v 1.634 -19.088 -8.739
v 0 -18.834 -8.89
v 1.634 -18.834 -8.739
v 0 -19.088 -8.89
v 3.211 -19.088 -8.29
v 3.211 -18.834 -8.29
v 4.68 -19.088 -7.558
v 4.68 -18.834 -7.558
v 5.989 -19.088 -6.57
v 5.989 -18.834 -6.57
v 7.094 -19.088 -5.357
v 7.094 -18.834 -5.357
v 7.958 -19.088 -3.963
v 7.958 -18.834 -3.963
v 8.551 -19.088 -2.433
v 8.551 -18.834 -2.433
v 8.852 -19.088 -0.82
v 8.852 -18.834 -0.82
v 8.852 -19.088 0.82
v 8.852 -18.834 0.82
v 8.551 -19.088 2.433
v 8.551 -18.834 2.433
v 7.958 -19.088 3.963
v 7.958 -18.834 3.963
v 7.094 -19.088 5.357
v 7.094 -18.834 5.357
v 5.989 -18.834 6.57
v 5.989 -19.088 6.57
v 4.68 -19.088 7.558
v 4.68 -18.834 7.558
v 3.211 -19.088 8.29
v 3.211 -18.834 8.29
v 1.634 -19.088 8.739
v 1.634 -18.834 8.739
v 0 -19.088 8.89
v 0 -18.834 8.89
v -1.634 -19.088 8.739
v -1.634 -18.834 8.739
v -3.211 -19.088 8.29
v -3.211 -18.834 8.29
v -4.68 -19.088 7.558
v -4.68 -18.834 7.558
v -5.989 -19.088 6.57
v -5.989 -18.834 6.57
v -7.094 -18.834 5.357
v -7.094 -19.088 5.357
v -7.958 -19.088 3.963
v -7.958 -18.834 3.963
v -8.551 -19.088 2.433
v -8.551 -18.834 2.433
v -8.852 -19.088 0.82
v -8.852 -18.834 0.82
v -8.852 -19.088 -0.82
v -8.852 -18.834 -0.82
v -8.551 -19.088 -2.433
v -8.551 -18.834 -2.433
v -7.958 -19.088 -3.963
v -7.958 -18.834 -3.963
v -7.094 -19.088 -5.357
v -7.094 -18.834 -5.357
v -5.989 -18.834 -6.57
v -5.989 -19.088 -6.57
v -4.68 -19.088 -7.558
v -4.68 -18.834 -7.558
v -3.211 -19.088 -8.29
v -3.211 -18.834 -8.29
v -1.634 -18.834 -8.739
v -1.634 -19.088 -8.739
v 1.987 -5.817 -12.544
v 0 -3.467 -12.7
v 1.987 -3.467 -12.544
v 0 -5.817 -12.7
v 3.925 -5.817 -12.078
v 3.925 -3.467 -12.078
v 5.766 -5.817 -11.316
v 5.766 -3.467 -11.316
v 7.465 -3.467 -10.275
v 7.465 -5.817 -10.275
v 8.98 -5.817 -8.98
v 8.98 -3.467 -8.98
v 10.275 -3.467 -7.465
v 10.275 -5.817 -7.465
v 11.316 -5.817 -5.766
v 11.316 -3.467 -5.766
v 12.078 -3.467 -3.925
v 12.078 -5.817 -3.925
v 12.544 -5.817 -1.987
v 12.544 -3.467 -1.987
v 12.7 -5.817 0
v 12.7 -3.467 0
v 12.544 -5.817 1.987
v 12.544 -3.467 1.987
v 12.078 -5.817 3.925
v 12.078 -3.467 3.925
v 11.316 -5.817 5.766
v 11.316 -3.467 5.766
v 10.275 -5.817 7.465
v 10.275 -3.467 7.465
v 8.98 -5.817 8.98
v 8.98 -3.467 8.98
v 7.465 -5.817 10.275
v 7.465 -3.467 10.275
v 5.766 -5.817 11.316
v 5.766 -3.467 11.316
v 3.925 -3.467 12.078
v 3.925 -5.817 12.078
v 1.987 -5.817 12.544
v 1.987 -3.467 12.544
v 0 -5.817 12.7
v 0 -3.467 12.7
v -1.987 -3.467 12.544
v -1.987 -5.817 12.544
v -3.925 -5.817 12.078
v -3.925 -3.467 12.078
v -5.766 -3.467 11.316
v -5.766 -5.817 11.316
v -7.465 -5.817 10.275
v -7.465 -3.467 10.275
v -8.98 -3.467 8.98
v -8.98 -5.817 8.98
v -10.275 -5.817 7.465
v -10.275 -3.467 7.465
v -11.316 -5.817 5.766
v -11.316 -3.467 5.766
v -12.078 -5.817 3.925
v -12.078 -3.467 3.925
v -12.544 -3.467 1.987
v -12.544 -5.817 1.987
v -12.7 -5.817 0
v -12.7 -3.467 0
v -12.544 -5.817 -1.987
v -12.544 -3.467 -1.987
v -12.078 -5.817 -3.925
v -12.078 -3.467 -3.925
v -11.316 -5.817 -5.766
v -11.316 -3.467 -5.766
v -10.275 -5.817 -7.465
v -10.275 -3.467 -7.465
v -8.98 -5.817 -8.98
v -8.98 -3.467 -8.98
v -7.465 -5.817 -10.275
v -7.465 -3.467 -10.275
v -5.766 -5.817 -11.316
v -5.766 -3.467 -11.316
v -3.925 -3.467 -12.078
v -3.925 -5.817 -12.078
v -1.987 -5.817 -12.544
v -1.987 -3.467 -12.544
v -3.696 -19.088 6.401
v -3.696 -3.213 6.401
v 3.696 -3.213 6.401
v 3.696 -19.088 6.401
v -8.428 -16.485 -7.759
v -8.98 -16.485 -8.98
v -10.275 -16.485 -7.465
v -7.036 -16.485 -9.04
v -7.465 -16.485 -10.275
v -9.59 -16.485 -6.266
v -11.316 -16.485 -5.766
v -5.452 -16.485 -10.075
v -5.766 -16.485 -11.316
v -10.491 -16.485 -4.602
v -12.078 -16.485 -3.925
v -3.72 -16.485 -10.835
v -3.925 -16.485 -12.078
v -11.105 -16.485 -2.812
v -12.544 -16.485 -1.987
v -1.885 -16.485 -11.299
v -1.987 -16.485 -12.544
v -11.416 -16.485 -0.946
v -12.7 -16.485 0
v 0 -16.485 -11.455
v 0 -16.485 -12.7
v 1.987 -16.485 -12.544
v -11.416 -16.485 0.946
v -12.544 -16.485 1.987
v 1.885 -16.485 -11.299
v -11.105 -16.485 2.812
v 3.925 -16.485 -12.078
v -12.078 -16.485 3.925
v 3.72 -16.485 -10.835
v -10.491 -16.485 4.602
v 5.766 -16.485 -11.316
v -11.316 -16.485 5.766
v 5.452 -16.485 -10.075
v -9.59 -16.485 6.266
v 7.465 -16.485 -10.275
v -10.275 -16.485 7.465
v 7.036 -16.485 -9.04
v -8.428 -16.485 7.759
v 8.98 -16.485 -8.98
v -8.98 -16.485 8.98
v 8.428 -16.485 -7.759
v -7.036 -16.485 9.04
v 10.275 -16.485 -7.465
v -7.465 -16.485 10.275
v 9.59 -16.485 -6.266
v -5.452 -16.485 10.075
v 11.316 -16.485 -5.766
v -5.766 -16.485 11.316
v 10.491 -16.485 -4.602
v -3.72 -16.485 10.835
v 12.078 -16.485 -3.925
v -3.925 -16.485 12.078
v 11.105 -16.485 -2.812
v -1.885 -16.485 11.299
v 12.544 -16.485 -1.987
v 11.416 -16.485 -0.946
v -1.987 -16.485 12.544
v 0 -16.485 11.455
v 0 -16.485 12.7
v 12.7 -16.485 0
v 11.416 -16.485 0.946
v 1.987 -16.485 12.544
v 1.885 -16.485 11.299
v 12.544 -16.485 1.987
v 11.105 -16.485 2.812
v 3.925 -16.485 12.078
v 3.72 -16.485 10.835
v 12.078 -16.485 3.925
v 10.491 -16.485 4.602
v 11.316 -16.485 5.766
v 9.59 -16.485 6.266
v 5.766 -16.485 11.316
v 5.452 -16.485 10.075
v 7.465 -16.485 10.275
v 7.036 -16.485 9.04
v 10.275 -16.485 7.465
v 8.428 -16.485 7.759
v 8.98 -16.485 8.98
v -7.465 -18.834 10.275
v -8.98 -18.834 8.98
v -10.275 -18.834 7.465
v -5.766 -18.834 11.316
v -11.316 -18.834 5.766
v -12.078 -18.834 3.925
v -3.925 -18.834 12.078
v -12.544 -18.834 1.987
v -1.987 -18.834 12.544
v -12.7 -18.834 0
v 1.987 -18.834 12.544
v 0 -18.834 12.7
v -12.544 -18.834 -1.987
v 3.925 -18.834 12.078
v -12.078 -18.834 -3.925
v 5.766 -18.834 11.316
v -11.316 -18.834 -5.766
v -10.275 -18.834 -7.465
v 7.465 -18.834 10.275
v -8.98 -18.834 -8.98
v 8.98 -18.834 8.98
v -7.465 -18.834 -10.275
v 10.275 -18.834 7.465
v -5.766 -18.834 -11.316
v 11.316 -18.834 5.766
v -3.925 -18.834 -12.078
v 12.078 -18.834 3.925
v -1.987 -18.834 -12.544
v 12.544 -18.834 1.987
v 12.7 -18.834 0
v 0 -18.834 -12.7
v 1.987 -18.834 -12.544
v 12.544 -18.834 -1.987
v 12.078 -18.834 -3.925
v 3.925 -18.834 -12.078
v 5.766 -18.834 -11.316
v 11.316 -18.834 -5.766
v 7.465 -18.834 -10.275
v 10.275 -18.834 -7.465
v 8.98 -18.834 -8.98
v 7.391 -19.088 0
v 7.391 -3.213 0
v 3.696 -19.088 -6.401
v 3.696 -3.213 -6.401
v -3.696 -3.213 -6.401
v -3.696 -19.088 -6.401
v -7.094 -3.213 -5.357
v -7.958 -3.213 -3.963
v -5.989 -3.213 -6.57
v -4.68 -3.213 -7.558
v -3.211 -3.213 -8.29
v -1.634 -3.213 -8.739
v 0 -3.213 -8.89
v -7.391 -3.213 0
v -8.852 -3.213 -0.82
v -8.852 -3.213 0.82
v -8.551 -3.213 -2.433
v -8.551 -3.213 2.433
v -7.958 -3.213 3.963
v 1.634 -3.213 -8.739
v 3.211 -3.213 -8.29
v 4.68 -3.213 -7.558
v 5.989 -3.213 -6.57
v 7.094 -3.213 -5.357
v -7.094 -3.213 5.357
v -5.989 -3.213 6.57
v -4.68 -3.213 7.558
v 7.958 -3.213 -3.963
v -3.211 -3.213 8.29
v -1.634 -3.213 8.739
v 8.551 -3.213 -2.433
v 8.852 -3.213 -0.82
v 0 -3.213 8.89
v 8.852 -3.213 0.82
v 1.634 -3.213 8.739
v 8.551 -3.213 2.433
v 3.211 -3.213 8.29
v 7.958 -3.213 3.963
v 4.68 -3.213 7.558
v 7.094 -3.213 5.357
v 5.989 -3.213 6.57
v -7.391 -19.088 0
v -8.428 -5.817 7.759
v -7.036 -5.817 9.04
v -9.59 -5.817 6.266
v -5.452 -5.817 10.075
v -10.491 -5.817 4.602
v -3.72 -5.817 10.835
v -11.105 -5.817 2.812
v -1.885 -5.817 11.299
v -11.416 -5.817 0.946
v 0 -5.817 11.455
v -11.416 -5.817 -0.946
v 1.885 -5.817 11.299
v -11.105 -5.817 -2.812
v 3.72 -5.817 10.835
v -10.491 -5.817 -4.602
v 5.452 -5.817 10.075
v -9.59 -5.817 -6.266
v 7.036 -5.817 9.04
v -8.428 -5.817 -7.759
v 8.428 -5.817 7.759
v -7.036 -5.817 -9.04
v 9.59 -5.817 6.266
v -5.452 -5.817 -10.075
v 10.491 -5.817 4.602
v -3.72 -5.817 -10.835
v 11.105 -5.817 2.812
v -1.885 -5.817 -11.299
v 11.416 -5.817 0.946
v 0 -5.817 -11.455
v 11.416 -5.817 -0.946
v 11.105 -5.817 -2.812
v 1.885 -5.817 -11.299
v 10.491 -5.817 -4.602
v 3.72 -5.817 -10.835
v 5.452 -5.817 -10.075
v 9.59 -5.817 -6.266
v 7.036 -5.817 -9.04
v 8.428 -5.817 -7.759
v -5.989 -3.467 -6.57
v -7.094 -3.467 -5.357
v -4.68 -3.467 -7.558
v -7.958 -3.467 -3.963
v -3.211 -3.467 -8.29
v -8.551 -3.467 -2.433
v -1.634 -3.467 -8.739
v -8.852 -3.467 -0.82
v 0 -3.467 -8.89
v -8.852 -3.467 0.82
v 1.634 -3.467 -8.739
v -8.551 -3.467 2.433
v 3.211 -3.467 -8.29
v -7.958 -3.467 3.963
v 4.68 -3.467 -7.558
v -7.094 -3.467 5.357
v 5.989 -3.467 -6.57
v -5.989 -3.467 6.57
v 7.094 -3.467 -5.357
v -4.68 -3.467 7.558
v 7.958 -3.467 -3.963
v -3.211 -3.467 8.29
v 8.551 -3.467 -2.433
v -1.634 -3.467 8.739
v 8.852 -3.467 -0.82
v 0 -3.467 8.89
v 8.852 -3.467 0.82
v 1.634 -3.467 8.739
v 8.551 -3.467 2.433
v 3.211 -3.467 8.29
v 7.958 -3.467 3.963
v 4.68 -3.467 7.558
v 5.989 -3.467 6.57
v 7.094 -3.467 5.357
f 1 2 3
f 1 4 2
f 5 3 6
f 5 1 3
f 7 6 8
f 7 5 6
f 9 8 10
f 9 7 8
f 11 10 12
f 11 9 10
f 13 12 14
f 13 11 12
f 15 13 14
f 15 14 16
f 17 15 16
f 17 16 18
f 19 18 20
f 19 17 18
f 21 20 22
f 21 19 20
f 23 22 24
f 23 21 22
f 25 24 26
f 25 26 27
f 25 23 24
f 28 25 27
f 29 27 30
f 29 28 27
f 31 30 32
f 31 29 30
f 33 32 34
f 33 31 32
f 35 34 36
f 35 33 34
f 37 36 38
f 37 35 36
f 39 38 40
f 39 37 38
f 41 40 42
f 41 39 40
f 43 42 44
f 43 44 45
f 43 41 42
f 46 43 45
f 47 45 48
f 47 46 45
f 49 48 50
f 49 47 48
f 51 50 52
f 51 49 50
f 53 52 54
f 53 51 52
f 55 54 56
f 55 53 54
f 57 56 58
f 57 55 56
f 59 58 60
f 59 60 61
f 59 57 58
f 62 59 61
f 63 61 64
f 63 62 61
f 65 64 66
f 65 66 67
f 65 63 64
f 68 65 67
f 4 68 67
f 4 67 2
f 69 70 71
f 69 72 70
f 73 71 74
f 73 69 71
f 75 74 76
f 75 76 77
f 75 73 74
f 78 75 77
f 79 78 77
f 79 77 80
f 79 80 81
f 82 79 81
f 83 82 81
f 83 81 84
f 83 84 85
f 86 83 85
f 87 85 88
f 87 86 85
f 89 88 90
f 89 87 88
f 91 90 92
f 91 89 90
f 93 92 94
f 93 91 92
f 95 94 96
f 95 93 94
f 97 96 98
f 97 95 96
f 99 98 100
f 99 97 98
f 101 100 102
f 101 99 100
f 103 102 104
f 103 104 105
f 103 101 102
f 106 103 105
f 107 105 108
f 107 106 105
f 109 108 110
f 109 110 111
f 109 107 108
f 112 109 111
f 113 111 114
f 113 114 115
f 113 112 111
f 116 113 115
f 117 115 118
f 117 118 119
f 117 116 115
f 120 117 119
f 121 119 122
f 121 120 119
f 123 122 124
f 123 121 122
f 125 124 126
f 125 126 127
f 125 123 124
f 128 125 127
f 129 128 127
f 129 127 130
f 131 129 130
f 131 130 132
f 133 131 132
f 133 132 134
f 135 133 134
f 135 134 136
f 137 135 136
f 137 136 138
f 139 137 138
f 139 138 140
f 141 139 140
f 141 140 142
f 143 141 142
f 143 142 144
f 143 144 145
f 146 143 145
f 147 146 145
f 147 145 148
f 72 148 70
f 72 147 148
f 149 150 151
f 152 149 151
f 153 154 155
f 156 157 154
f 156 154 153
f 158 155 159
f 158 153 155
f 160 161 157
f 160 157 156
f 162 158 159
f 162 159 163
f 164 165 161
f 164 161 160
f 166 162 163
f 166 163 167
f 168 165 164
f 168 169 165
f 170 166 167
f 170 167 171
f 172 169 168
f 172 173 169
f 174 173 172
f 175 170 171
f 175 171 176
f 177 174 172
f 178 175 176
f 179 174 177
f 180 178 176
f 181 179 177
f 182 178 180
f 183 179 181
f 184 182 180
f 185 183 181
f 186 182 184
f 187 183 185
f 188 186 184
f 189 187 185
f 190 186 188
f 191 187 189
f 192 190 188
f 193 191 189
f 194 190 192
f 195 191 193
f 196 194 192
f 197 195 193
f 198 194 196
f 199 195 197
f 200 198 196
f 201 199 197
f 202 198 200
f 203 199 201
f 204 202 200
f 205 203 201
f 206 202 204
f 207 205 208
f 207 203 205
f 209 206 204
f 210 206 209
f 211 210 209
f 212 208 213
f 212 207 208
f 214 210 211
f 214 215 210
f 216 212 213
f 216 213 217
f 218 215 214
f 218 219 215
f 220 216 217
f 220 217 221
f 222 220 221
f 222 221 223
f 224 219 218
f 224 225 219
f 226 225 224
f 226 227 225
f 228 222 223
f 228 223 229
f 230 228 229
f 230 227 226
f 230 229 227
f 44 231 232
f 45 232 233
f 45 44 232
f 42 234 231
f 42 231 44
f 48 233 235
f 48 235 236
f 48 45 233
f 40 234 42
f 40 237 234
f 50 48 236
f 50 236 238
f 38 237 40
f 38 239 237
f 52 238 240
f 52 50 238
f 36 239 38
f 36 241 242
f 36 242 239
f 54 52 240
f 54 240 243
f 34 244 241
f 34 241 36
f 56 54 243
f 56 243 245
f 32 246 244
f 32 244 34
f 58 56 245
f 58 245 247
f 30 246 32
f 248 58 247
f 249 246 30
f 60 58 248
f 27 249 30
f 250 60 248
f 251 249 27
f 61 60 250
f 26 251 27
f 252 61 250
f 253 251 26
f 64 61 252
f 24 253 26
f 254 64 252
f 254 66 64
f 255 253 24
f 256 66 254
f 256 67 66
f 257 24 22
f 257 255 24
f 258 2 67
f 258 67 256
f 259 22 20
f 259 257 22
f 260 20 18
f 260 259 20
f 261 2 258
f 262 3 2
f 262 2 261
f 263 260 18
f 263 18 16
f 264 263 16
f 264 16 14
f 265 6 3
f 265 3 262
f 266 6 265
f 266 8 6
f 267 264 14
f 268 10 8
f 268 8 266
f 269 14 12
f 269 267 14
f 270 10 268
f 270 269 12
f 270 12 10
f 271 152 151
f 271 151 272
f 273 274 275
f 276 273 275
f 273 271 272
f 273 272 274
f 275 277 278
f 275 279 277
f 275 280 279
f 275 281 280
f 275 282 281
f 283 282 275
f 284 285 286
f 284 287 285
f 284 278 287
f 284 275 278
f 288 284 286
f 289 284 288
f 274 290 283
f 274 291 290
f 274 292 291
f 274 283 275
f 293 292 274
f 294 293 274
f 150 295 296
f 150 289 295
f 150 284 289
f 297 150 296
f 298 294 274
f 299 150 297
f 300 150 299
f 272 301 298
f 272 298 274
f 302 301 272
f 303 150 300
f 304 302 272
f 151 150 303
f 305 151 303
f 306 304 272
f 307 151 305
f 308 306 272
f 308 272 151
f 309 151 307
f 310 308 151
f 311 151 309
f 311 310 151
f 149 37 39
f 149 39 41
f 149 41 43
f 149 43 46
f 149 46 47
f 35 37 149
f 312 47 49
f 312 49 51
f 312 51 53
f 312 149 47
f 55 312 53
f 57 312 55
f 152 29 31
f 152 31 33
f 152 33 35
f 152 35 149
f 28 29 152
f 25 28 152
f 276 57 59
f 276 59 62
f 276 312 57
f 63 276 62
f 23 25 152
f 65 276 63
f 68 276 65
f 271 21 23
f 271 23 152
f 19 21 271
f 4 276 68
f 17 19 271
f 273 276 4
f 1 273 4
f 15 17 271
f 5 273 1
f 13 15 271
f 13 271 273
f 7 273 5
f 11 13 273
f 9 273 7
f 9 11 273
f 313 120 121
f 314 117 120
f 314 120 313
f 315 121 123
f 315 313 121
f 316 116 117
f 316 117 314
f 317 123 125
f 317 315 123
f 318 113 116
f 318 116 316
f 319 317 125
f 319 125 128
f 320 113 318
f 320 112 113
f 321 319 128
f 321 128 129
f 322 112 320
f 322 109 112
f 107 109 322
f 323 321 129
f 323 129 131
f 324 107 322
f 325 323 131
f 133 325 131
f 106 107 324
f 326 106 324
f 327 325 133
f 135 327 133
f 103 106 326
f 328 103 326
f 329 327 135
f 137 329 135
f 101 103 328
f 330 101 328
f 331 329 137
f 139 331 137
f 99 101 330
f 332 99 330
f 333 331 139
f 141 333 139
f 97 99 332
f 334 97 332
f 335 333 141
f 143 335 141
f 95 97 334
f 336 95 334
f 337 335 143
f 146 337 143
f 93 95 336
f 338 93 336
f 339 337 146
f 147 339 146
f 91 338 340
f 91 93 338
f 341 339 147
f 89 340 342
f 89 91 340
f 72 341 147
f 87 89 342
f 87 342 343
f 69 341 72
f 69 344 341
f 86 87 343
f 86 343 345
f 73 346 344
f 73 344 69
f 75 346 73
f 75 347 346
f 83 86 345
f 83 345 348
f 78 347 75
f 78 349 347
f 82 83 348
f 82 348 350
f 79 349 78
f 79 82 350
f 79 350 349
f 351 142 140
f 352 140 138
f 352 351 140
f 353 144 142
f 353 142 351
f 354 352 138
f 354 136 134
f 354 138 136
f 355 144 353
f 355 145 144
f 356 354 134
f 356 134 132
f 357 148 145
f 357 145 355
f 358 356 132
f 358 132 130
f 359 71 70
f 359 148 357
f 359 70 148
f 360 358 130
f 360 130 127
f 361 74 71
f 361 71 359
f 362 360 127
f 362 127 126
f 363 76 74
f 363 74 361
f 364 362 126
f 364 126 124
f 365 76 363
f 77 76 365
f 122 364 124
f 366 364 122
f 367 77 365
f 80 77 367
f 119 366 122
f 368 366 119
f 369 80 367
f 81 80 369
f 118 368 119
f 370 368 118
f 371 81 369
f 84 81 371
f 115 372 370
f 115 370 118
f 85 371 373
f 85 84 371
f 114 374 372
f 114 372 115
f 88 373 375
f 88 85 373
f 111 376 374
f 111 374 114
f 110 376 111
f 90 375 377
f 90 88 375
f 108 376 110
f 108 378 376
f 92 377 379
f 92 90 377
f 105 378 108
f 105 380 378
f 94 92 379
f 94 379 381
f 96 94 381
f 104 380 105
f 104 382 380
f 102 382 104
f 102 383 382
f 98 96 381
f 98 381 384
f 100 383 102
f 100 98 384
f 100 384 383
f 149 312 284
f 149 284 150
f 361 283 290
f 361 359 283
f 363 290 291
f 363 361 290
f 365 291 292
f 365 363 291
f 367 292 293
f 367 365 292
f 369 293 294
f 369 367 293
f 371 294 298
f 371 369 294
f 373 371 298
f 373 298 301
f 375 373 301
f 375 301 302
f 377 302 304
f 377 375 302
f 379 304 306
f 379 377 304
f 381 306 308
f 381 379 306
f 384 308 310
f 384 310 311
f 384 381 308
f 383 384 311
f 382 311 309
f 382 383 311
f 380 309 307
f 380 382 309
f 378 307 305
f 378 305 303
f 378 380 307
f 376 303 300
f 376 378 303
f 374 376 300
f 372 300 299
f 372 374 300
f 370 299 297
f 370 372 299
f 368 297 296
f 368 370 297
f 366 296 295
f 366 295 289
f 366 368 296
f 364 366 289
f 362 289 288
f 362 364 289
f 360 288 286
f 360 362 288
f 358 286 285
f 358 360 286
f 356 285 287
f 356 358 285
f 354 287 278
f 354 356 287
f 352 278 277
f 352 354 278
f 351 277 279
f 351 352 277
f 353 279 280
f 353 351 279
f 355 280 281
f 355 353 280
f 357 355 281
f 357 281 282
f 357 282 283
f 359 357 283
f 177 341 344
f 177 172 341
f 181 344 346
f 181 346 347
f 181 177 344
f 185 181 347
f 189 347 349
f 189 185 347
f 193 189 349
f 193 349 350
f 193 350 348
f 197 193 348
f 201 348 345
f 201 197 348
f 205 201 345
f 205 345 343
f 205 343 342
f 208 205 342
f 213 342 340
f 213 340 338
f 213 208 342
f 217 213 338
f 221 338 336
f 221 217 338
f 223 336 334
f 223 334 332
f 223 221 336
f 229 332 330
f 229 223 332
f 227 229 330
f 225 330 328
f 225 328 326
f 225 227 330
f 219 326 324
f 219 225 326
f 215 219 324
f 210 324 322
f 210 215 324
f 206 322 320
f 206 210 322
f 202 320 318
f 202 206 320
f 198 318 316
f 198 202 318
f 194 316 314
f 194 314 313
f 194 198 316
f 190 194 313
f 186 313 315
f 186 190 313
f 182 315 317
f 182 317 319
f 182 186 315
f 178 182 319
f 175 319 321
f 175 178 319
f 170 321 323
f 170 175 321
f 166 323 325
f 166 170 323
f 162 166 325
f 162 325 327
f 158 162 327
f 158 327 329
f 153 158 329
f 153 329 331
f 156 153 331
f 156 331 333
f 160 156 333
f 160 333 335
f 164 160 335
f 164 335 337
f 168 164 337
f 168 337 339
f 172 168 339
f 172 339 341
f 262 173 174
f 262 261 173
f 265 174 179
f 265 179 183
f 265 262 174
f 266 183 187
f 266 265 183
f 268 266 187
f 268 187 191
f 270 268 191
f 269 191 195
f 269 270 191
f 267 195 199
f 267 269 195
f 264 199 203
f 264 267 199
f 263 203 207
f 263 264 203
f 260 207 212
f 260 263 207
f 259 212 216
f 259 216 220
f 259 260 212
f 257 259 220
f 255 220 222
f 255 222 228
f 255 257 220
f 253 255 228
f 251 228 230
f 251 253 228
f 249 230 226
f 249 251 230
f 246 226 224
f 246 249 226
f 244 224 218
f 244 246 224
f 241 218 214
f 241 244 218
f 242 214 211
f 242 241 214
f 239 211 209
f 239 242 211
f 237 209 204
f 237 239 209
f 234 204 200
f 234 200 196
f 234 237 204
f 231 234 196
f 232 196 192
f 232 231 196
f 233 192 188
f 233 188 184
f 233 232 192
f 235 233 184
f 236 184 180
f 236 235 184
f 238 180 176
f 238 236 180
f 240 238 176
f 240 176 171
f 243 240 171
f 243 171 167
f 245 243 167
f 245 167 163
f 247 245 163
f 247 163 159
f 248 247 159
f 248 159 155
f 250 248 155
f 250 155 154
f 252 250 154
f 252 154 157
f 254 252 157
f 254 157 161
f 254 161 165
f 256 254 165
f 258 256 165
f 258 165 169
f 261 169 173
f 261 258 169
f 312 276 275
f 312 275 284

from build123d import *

# Parameters (mm, degrees)
CUT_EXTRUDE1_DEPTH      = 1
CUT_EXTRUDE1_DEPTH_BACK = 16.875


with BuildPart() as part:
    # Sketch2 → Revolve1 (revolve)
    with BuildSketch(Plane(origin=(0, 0, 0), x_dir=(0, 0, -1), z_dir=(1, 0, 0))):
        Polygon((2.54, -3.2131), (8.89, -3.2131), (8.89, -3.4671), (12.7, -3.4671), (12.7, -5.8166), (11.4554, -5.8166), (11.4554, -16.4846), (12.7, -16.4846), (12.7, -18.8341), (8.89, -18.8341), (8.89, -19.0881), (2.54, -19.0881), align=None)
    revolve(axis=Axis((0, 55, 0), (0, -1, 0)))

    # Sketch3 → Cut-Extrude1 (cut, two sides)
    with BuildSketch(Plane(origin=(0, -3.2131, 0), x_dir=(1, 0, 0), z_dir=(0, 1, 0))) as cut_extrude1_sk:
        Polygon((3.695503603, 6.4008), (-3.695503603, 6.4008), (-7.391007206, 0), (-3.695503603, -6.4008), (3.695503603, -6.4008), (7.391007206, 0), align=None)
    extrude(amount=CUT_EXTRUDE1_DEPTH, mode=Mode.SUBTRACT)
    extrude(cut_extrude1_sk.sketch, amount=-CUT_EXTRUDE1_DEPTH_BACK, mode=Mode.SUBTRACT)


solid = part.part
